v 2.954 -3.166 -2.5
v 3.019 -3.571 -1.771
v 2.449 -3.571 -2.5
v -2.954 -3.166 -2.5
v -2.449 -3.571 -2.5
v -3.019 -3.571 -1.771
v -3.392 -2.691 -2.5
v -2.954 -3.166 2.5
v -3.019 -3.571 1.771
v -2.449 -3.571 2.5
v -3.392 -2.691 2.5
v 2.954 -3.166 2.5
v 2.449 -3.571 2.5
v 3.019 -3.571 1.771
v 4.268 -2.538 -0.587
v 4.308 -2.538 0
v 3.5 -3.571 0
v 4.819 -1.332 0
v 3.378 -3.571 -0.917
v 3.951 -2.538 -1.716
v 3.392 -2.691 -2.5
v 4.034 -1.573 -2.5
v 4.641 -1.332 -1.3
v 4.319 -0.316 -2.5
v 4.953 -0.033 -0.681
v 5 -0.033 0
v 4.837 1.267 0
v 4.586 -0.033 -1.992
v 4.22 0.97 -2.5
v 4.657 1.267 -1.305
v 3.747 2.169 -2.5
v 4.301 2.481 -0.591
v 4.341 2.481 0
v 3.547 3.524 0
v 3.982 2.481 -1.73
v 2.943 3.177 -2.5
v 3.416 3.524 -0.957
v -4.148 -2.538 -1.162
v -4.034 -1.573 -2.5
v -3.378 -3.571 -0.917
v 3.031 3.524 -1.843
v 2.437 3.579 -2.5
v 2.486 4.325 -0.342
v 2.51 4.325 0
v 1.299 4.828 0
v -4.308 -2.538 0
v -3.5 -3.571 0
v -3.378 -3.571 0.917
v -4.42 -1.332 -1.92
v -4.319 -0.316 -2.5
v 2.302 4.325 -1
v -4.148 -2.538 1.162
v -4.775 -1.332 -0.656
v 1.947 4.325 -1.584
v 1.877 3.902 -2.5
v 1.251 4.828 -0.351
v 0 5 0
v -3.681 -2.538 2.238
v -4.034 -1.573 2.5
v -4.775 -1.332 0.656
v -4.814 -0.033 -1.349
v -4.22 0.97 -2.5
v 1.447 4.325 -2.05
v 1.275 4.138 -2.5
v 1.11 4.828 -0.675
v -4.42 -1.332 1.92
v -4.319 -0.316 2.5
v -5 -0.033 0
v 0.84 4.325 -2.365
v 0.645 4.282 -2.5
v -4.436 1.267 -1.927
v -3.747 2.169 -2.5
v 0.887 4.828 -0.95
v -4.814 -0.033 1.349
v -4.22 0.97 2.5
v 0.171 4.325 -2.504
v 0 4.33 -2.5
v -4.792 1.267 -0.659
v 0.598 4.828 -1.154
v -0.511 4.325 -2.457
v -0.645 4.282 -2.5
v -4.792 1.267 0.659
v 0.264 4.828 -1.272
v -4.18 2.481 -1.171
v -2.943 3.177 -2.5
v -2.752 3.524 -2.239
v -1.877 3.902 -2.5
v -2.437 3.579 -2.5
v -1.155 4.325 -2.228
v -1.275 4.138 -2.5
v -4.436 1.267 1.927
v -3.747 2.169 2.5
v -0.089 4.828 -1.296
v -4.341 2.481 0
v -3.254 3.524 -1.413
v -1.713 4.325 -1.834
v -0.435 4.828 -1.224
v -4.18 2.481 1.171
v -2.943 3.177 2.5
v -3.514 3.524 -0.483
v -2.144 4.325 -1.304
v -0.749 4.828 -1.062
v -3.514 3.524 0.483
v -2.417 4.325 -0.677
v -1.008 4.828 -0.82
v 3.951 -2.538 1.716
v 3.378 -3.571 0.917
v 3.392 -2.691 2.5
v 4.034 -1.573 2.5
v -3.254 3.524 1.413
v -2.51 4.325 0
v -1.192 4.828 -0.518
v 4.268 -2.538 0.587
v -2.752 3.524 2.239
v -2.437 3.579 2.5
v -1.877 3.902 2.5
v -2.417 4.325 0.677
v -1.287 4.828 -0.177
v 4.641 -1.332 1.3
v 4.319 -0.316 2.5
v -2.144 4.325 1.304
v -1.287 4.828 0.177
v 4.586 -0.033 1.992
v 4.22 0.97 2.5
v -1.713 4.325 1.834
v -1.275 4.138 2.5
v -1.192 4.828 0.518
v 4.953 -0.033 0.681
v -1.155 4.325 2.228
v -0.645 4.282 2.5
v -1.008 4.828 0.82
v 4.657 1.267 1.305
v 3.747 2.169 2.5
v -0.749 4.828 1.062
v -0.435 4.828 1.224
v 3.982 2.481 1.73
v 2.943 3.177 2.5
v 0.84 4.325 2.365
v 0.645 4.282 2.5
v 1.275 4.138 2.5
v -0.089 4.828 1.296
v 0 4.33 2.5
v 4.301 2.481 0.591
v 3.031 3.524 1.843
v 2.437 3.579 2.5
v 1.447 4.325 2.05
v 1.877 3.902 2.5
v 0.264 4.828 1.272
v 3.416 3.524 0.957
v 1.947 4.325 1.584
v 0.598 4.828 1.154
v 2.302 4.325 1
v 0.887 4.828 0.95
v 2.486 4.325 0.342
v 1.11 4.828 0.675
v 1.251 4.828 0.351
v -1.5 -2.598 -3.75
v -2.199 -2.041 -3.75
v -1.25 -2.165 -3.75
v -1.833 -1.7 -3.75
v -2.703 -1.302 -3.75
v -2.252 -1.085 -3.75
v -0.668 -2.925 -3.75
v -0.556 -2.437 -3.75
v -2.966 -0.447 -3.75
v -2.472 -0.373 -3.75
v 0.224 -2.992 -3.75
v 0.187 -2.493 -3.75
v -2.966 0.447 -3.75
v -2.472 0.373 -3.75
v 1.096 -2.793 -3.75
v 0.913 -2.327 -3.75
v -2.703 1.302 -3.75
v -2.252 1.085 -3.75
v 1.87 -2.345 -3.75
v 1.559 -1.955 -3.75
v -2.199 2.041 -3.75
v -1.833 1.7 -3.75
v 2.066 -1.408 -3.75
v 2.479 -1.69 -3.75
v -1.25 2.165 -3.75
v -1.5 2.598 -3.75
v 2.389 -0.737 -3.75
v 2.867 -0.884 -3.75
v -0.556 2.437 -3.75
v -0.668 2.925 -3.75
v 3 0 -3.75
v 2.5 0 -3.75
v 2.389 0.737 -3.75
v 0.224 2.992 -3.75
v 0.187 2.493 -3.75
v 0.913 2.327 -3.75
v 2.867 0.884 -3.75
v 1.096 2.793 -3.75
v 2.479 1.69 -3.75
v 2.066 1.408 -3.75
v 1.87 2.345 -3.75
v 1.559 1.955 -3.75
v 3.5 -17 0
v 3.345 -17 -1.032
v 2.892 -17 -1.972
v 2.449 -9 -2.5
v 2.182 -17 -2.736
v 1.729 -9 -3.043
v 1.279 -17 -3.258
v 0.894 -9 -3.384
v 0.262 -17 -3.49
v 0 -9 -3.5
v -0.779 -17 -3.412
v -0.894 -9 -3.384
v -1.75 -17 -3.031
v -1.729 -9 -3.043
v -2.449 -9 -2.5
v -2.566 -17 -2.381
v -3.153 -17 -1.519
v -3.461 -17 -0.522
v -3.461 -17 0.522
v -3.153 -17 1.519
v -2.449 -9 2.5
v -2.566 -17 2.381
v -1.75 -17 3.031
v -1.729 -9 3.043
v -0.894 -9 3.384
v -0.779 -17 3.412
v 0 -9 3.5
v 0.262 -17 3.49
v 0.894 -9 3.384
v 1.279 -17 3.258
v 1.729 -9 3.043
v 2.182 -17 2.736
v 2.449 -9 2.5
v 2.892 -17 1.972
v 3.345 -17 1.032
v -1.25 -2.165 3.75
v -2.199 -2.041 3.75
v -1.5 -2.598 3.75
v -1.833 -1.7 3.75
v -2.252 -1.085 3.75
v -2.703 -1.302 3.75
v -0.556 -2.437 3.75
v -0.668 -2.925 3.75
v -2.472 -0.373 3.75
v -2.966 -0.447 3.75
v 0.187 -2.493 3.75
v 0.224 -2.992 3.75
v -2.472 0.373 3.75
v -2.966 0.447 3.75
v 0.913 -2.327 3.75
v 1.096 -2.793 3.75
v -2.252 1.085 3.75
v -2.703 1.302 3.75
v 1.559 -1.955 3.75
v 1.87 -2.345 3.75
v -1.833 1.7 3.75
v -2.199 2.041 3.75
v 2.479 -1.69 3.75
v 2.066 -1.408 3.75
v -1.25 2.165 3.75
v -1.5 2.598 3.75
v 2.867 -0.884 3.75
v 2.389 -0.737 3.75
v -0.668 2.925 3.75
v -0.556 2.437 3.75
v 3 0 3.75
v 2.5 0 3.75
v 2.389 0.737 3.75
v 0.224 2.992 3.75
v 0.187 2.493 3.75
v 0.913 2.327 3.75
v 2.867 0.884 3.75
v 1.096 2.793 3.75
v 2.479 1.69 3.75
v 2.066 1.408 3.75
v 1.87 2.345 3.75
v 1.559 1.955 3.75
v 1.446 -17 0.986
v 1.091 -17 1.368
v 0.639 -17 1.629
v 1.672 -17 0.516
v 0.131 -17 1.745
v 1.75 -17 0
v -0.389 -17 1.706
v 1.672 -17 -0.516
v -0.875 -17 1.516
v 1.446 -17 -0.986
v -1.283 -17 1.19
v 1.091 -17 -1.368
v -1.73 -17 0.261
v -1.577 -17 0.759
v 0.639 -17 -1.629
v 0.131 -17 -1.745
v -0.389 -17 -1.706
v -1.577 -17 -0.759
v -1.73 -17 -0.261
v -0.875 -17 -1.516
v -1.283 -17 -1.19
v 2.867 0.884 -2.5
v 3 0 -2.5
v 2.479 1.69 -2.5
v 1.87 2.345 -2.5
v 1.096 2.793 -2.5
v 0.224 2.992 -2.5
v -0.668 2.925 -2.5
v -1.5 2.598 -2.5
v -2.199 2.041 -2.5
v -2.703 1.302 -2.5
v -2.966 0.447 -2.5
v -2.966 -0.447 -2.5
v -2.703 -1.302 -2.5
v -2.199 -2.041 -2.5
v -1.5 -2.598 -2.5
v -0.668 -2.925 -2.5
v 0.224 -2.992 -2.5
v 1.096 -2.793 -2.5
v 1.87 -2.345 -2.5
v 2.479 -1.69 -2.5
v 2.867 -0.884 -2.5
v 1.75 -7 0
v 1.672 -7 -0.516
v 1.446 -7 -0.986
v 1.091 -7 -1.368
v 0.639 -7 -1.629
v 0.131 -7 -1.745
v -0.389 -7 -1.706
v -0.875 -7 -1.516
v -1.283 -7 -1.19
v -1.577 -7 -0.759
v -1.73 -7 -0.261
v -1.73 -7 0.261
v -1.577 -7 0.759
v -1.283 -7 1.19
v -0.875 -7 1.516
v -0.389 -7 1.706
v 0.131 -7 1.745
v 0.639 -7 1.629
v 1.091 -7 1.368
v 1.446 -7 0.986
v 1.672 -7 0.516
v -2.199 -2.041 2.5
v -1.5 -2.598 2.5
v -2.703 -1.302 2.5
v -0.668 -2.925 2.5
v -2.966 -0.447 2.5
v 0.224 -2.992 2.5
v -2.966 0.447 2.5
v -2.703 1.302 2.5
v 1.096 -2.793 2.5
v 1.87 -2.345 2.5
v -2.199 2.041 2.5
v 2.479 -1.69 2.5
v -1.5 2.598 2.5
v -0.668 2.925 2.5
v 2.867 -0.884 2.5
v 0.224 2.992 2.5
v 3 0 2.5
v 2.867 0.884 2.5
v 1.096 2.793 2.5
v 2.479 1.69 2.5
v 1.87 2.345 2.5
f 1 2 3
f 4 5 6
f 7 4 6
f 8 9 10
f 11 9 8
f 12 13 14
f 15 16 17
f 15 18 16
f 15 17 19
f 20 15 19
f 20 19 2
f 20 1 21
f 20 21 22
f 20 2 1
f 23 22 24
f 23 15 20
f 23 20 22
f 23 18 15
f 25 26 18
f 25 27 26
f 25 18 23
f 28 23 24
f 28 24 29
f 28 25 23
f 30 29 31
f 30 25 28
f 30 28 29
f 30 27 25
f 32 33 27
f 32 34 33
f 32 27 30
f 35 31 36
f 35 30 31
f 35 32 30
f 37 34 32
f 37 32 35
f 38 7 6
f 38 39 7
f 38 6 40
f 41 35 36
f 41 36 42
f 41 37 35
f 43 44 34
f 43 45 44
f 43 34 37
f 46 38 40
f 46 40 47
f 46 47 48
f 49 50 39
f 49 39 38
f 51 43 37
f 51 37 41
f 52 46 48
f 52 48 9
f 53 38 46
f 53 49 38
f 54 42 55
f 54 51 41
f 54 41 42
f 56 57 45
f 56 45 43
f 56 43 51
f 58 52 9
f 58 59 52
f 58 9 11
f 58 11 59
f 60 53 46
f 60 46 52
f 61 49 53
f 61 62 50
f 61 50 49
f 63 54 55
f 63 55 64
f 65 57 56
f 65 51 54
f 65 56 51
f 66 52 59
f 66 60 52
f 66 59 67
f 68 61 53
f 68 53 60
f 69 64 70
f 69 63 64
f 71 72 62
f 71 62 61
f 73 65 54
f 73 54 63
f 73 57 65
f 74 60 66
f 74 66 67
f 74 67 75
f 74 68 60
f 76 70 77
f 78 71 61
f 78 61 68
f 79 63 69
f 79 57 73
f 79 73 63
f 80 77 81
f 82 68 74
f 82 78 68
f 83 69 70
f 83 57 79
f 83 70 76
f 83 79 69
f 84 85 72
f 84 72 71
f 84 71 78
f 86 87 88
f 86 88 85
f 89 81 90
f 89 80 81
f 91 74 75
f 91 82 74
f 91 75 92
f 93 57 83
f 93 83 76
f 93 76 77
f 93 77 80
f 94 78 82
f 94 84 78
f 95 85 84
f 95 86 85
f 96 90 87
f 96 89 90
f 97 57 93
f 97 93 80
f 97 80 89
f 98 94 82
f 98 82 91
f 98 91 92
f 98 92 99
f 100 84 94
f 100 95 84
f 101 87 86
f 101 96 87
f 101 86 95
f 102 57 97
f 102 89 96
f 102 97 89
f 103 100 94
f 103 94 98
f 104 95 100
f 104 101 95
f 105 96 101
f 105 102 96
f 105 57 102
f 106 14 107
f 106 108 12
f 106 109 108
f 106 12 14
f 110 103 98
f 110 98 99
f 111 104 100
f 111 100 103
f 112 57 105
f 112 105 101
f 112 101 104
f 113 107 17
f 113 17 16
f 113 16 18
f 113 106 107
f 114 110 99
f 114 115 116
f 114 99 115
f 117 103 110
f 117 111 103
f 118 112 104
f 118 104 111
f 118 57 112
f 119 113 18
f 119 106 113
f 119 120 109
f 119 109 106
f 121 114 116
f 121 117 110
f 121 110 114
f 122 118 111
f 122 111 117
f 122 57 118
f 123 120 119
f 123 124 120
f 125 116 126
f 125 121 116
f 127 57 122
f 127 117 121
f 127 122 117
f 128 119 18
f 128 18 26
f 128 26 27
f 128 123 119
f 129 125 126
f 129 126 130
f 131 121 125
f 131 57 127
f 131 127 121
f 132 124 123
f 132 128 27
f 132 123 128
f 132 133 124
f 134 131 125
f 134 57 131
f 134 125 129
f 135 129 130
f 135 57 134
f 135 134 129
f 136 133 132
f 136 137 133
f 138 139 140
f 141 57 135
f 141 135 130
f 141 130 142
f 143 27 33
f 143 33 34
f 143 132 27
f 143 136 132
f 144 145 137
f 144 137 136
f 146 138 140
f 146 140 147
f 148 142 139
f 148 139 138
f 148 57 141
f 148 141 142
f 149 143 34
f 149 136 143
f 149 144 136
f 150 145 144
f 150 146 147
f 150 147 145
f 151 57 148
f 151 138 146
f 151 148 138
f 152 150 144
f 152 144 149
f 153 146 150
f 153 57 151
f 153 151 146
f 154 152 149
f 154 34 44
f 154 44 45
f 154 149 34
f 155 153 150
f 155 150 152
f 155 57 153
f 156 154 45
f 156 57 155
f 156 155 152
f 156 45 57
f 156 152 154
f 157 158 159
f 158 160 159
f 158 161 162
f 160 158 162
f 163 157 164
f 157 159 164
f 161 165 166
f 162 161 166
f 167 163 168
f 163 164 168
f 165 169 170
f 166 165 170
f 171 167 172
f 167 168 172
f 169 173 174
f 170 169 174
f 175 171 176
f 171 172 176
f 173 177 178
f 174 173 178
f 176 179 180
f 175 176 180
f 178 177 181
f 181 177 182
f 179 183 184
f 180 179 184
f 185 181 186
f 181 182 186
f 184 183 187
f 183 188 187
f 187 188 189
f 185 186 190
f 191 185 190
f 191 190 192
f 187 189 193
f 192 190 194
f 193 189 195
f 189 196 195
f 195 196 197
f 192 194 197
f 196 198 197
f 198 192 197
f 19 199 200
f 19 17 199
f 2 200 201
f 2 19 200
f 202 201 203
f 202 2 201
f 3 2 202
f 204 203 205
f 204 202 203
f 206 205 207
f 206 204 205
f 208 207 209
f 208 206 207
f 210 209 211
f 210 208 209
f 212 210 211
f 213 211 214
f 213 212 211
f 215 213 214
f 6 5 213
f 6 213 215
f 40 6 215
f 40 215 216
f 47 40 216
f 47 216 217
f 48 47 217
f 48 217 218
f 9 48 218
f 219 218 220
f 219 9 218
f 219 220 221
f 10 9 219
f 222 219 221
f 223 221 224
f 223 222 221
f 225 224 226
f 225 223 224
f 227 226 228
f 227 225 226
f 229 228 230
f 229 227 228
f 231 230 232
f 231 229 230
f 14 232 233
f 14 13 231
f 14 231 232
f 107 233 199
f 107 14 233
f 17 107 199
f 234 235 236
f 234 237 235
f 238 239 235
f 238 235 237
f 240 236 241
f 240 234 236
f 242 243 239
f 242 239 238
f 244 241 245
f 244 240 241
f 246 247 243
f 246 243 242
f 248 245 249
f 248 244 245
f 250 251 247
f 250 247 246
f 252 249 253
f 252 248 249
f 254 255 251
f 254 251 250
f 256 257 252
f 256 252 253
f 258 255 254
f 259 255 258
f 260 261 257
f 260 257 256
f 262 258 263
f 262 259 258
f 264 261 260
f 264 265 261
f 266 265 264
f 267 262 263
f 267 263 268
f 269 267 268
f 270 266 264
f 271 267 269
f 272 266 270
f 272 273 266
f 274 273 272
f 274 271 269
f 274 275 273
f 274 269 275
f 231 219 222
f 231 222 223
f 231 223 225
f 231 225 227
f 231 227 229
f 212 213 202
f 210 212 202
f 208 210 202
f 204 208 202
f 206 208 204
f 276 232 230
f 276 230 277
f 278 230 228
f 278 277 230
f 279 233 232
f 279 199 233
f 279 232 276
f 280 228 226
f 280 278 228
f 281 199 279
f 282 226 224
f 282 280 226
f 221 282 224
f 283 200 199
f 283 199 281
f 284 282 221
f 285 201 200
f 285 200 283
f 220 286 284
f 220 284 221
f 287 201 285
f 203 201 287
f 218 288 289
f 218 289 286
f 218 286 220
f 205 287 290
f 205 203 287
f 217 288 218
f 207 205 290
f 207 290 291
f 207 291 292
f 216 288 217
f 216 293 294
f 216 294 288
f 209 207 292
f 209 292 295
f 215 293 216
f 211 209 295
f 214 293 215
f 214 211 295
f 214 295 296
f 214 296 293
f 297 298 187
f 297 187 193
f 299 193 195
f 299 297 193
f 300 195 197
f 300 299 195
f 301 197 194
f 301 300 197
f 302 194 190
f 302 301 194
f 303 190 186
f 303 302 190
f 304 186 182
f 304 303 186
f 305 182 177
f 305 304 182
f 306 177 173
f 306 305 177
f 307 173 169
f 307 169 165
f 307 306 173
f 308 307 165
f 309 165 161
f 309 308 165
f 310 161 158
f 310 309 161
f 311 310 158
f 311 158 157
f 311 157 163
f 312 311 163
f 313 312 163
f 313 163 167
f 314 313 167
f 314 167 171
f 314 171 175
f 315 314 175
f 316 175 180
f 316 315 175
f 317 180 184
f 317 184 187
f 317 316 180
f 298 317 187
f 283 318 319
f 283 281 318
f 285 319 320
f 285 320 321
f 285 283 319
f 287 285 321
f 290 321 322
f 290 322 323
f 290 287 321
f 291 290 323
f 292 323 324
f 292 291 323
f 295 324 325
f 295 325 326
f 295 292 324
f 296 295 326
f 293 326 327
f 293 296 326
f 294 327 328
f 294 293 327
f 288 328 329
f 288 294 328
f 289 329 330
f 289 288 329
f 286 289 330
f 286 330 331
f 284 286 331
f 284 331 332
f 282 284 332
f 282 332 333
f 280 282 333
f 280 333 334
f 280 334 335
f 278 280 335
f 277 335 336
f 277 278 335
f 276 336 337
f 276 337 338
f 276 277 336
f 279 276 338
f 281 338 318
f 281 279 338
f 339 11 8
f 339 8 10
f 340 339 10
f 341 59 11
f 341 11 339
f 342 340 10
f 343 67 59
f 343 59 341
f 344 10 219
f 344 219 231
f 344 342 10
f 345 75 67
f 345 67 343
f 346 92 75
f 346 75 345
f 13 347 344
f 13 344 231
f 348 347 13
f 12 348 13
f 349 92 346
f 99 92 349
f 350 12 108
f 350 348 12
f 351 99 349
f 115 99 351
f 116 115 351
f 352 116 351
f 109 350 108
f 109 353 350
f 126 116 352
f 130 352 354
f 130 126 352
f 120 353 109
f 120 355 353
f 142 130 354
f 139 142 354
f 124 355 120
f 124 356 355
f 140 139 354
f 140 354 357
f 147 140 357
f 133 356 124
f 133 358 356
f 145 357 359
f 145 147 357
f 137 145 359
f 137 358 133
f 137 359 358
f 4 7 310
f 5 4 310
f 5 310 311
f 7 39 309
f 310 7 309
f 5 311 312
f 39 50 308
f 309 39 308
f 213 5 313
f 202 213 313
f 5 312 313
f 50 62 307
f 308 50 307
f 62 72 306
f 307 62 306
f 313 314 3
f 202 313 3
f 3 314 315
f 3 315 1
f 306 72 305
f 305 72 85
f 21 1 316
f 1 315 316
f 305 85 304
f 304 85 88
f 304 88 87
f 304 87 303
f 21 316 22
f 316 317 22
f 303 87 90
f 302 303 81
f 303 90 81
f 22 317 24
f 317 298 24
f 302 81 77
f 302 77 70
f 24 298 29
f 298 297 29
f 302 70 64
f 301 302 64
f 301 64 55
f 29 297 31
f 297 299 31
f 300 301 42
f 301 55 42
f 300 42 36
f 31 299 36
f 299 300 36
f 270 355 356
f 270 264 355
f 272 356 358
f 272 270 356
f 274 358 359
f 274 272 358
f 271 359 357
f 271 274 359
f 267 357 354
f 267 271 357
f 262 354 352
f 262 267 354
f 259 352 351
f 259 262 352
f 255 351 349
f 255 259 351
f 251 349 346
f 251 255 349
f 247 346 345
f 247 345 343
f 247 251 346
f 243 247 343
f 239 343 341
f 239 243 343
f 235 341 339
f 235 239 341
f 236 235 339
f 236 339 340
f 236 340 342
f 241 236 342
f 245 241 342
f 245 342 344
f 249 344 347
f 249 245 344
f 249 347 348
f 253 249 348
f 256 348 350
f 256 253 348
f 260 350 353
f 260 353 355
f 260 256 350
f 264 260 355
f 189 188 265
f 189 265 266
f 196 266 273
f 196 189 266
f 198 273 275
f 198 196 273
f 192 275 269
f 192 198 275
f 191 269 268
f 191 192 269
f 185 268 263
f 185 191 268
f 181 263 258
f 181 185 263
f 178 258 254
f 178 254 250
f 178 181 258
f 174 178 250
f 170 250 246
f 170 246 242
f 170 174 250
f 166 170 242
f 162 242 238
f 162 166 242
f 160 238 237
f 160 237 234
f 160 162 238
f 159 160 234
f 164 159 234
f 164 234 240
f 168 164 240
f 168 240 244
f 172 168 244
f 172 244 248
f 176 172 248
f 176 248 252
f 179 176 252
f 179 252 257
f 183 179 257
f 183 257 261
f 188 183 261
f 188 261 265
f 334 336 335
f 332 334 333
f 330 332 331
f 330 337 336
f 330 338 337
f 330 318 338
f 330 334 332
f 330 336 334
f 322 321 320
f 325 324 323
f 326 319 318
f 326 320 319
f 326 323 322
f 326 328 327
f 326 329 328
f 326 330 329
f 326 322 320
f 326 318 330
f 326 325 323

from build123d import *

# Parameters (mm, degrees)
SKETCH2_R               = 2.5
CUT_EXTRUDE1_DEPTH      = 6
CUT_EXTRUDE1_DEPTH_BACK = 6
SKETCH4_W               = 12
SKETCH4_H               = 18
CUT_EXTRUDE2_DEPTH      = 1.830127
SKETCH3_R               = 3
SKETCH3_R_2             = 2.5
EXTRUDE_THIN1_DEPTH     = 3.75


with BuildPart() as part:
    # Sketch1 → Revolve1 (revolve)
    with BuildSketch(Plane.XY):
        with BuildLine():
            Line((0, 0), (0, -7))
            Line((0, -7), (1.75, -7))
            Line((1.75, -7), (1.75, -17))
            Line((1.75, -17), (3.5, -17))
            Line((3.5, -17), (3.5, -3.570714214))
            ThreePointArc((3.5, -3.570714214), (4.628907596, 1.890294809), (0, 5))
            Line((0, 5), (0, 0))
        make_face()
    revolve(axis=Axis((0, 0, 0), (0, 1, 0)))

    # Sketch2 → Cut-Extrude1 (cut, two sides)
    with BuildSketch(Plane.XY) as cut_extrude1_sk:
        Circle(SKETCH2_R)
    extrude(amount=CUT_EXTRUDE1_DEPTH, mode=Mode.SUBTRACT)
    extrude(cut_extrude1_sk.sketch, amount=-CUT_EXTRUDE1_DEPTH_BACK, mode=Mode.SUBTRACT)

    # Sketch4 → Cut-Extrude2 (cut)
    with BuildSketch(Plane.XY.offset(2.5)):
        Rectangle(SKETCH4_W, SKETCH4_H)
    cut_extrude2 = extrude(amount=CUT_EXTRUDE2_DEPTH, mode=Mode.SUBTRACT)

    # Mirror1: Cut-Extrude2 across plane
    add(cut_extrude2.mirror(Plane.XY), mode=Mode.SUBTRACT)

    # Sketch3 → Extrude-Thin1 (add, symmetric)
    with BuildSketch(Plane.XY):
        Circle(SKETCH3_R)
        Circle(SKETCH3_R_2, mode=Mode.SUBTRACT)
    extrude(amount=EXTRUDE_THIN1_DEPTH, both=True)


solid = part.part
